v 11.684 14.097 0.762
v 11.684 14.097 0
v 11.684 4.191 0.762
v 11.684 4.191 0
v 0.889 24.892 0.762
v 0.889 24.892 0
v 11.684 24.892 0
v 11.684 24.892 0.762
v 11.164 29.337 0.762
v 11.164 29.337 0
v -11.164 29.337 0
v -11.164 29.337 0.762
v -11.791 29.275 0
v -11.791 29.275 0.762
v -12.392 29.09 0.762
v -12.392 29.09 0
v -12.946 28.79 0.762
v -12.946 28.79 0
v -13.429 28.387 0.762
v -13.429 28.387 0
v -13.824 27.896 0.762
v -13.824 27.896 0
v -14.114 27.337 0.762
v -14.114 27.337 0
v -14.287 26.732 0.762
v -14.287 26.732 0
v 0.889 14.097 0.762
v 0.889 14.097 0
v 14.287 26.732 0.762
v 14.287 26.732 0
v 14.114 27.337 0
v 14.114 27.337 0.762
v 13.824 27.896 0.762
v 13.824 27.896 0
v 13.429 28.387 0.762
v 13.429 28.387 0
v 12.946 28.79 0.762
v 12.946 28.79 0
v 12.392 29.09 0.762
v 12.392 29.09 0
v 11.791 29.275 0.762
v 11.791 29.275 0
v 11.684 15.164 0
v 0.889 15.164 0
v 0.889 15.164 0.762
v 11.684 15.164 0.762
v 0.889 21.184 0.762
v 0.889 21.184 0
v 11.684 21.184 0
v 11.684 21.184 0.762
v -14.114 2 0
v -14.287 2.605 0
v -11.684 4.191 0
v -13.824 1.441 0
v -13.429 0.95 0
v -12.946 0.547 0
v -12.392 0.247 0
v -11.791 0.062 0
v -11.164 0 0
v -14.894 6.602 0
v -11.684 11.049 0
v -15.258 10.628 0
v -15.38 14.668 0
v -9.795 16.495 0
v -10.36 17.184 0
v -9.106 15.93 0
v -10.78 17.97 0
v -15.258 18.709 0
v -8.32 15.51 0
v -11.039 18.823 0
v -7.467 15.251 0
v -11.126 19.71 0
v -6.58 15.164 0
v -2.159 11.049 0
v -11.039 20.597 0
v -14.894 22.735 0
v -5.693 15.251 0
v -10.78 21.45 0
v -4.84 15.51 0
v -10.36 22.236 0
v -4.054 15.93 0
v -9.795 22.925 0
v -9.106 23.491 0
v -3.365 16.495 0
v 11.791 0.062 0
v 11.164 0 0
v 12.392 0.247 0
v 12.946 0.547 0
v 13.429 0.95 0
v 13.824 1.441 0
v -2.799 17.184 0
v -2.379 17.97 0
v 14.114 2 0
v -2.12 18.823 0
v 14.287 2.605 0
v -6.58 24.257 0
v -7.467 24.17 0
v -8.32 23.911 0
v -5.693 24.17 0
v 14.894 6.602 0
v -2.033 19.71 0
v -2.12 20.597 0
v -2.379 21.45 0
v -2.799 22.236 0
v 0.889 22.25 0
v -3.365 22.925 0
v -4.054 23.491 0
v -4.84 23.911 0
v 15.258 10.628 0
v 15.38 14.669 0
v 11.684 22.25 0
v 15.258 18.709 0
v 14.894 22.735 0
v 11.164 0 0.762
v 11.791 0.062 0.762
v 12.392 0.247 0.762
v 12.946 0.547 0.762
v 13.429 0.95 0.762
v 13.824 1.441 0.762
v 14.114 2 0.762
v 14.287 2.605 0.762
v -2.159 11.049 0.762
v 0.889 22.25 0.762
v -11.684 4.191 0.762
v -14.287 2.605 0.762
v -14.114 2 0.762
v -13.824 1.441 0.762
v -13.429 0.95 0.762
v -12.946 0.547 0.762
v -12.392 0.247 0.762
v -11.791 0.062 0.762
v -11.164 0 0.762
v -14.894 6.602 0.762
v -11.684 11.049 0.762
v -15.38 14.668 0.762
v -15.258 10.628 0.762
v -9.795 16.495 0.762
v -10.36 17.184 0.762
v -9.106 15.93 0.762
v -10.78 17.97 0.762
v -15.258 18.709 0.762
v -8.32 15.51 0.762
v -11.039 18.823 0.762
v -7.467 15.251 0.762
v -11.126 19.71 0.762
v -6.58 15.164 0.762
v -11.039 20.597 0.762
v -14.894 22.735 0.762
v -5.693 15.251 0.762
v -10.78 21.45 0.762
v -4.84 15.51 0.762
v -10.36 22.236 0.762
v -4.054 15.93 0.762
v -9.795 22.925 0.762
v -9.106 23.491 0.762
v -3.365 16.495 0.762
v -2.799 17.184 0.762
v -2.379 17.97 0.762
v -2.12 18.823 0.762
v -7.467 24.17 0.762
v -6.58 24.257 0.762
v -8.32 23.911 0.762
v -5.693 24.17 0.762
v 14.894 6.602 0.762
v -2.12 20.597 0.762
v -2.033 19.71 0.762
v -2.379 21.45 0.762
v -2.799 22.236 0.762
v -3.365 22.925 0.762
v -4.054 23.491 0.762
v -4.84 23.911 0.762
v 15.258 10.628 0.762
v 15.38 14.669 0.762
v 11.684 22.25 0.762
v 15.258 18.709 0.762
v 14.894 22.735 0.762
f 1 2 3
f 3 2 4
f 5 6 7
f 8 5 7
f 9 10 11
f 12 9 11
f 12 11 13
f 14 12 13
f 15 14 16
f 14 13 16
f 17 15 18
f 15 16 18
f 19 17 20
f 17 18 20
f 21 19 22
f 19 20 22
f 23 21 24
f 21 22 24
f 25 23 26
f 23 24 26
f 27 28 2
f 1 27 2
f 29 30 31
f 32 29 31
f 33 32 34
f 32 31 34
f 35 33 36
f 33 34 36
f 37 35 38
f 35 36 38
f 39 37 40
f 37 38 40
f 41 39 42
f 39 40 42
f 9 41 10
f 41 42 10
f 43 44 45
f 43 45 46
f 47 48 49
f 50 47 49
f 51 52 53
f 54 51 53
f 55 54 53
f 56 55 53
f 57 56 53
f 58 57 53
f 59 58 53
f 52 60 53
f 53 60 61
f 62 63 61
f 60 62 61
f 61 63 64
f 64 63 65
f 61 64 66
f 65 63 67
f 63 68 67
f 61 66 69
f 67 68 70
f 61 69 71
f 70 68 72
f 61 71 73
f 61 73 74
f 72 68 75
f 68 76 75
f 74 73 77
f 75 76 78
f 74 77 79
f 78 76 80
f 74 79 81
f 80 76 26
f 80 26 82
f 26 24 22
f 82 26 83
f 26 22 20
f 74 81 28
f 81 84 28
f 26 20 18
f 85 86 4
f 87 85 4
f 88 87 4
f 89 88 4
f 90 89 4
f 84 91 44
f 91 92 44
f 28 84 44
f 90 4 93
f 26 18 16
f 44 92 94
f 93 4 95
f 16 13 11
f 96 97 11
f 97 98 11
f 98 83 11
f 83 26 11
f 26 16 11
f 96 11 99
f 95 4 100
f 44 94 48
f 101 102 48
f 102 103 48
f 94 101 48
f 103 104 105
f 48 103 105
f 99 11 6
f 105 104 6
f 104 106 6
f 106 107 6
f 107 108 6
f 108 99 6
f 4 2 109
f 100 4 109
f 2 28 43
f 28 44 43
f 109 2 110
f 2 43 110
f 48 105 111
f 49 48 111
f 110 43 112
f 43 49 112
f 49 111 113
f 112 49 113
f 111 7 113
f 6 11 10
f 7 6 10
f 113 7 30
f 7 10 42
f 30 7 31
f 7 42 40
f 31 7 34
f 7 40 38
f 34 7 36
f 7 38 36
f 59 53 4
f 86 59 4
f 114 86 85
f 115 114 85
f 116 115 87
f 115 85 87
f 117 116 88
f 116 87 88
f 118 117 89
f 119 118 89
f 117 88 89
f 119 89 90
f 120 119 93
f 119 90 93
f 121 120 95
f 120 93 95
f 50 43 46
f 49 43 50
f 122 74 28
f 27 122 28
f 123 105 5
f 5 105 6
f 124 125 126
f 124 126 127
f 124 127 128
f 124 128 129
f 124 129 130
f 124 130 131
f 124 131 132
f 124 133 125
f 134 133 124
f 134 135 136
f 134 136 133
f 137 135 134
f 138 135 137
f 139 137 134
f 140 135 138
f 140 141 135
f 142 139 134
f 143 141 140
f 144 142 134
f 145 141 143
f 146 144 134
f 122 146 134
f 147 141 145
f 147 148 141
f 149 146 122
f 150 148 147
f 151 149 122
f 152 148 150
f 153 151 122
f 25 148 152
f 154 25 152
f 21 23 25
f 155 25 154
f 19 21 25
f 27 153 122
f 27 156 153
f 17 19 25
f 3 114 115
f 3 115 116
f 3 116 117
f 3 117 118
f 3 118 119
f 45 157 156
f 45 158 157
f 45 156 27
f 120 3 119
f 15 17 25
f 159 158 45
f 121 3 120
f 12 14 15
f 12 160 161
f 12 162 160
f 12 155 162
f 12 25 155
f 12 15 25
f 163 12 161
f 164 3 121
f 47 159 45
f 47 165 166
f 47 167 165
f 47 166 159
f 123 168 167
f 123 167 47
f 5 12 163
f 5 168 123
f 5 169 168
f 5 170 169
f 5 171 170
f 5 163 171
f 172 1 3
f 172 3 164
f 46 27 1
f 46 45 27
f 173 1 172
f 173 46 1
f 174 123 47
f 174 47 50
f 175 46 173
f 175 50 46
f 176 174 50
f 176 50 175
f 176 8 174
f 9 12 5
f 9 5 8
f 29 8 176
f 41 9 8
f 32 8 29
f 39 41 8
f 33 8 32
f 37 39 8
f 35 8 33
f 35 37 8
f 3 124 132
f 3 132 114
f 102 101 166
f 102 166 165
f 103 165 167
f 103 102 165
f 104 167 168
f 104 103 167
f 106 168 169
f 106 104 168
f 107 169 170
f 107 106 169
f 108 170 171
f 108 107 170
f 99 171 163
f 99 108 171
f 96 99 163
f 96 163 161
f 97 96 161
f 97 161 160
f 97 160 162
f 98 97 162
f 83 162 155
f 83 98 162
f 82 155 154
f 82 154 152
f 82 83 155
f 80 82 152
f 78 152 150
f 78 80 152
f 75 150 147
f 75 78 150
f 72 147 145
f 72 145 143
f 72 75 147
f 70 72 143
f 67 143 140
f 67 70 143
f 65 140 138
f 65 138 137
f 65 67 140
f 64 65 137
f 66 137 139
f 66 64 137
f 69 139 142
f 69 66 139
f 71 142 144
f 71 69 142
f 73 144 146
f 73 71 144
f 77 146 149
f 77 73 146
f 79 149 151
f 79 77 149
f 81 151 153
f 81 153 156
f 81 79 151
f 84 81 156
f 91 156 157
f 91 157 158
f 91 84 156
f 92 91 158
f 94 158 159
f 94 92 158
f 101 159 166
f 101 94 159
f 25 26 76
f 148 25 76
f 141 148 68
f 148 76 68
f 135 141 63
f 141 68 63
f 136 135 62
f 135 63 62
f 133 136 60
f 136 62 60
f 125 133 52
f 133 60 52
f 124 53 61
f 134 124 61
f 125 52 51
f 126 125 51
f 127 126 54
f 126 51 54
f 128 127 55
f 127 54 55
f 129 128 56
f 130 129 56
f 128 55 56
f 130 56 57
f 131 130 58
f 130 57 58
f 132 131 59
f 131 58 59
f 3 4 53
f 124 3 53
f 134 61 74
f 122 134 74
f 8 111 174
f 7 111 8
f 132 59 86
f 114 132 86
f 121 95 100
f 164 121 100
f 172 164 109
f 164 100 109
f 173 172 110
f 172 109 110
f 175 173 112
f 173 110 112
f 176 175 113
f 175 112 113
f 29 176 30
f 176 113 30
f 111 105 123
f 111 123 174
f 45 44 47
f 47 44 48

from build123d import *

# Parameters (mm, degrees)
F0_R     = 4.5466
F0_W     = 10.795
F0_H     = 6.0198
F0_H_2   = 2.6416
F1_DEPTH = 0.762


with BuildPart() as f1:
    # F0 (on Top) → F1 (new body)
    with BuildSketch(Plane.XY):
        with BuildLine():
            ThreePointArc((-14.2875, 2.604771), (-13.197614, 0.73665), (-11.164126, 0))
            Line((-11.164126, 0), (11.164126, 0))
            ThreePointArc((11.164126, 0), (13.197614, 0.73665), (14.2875, 2.604771))
            ThreePointArc((14.2875, 2.604771), (15.3797, 14.6685), (14.2875, 26.732229))
            ThreePointArc((14.2875, 26.732229), (13.197614, 28.60035), (11.164126, 29.337))
            Line((11.164126, 29.337), (-11.164126, 29.337))
            ThreePointArc((-11.164126, 29.337), (-13.197614, 28.60035), (-14.2875, 26.732229))
            ThreePointArc((-14.2875, 26.732229), (-15.3797, 14.6685), (-14.2875, 2.604771))
        make_face()
        Polygon((0.889, 14.097), (11.684, 14.097), (11.684, 4.191), (-11.684, 4.191), (-11.684, 11.049), (-2.159, 11.049), align=None, mode=Mode.SUBTRACT)
        with Locations((-6.579606, 19.7104)):
            Circle(F0_R, mode=Mode.SUBTRACT)
        with Locations((6.2865, 18.1737)):
            Rectangle(F0_W, F0_H, mode=Mode.SUBTRACT)
        with Locations((6.2865, 23.5712)):
            Rectangle(F0_W, F0_H_2, mode=Mode.SUBTRACT)
    extrude(amount=F1_DEPTH)


solid = f1.part
